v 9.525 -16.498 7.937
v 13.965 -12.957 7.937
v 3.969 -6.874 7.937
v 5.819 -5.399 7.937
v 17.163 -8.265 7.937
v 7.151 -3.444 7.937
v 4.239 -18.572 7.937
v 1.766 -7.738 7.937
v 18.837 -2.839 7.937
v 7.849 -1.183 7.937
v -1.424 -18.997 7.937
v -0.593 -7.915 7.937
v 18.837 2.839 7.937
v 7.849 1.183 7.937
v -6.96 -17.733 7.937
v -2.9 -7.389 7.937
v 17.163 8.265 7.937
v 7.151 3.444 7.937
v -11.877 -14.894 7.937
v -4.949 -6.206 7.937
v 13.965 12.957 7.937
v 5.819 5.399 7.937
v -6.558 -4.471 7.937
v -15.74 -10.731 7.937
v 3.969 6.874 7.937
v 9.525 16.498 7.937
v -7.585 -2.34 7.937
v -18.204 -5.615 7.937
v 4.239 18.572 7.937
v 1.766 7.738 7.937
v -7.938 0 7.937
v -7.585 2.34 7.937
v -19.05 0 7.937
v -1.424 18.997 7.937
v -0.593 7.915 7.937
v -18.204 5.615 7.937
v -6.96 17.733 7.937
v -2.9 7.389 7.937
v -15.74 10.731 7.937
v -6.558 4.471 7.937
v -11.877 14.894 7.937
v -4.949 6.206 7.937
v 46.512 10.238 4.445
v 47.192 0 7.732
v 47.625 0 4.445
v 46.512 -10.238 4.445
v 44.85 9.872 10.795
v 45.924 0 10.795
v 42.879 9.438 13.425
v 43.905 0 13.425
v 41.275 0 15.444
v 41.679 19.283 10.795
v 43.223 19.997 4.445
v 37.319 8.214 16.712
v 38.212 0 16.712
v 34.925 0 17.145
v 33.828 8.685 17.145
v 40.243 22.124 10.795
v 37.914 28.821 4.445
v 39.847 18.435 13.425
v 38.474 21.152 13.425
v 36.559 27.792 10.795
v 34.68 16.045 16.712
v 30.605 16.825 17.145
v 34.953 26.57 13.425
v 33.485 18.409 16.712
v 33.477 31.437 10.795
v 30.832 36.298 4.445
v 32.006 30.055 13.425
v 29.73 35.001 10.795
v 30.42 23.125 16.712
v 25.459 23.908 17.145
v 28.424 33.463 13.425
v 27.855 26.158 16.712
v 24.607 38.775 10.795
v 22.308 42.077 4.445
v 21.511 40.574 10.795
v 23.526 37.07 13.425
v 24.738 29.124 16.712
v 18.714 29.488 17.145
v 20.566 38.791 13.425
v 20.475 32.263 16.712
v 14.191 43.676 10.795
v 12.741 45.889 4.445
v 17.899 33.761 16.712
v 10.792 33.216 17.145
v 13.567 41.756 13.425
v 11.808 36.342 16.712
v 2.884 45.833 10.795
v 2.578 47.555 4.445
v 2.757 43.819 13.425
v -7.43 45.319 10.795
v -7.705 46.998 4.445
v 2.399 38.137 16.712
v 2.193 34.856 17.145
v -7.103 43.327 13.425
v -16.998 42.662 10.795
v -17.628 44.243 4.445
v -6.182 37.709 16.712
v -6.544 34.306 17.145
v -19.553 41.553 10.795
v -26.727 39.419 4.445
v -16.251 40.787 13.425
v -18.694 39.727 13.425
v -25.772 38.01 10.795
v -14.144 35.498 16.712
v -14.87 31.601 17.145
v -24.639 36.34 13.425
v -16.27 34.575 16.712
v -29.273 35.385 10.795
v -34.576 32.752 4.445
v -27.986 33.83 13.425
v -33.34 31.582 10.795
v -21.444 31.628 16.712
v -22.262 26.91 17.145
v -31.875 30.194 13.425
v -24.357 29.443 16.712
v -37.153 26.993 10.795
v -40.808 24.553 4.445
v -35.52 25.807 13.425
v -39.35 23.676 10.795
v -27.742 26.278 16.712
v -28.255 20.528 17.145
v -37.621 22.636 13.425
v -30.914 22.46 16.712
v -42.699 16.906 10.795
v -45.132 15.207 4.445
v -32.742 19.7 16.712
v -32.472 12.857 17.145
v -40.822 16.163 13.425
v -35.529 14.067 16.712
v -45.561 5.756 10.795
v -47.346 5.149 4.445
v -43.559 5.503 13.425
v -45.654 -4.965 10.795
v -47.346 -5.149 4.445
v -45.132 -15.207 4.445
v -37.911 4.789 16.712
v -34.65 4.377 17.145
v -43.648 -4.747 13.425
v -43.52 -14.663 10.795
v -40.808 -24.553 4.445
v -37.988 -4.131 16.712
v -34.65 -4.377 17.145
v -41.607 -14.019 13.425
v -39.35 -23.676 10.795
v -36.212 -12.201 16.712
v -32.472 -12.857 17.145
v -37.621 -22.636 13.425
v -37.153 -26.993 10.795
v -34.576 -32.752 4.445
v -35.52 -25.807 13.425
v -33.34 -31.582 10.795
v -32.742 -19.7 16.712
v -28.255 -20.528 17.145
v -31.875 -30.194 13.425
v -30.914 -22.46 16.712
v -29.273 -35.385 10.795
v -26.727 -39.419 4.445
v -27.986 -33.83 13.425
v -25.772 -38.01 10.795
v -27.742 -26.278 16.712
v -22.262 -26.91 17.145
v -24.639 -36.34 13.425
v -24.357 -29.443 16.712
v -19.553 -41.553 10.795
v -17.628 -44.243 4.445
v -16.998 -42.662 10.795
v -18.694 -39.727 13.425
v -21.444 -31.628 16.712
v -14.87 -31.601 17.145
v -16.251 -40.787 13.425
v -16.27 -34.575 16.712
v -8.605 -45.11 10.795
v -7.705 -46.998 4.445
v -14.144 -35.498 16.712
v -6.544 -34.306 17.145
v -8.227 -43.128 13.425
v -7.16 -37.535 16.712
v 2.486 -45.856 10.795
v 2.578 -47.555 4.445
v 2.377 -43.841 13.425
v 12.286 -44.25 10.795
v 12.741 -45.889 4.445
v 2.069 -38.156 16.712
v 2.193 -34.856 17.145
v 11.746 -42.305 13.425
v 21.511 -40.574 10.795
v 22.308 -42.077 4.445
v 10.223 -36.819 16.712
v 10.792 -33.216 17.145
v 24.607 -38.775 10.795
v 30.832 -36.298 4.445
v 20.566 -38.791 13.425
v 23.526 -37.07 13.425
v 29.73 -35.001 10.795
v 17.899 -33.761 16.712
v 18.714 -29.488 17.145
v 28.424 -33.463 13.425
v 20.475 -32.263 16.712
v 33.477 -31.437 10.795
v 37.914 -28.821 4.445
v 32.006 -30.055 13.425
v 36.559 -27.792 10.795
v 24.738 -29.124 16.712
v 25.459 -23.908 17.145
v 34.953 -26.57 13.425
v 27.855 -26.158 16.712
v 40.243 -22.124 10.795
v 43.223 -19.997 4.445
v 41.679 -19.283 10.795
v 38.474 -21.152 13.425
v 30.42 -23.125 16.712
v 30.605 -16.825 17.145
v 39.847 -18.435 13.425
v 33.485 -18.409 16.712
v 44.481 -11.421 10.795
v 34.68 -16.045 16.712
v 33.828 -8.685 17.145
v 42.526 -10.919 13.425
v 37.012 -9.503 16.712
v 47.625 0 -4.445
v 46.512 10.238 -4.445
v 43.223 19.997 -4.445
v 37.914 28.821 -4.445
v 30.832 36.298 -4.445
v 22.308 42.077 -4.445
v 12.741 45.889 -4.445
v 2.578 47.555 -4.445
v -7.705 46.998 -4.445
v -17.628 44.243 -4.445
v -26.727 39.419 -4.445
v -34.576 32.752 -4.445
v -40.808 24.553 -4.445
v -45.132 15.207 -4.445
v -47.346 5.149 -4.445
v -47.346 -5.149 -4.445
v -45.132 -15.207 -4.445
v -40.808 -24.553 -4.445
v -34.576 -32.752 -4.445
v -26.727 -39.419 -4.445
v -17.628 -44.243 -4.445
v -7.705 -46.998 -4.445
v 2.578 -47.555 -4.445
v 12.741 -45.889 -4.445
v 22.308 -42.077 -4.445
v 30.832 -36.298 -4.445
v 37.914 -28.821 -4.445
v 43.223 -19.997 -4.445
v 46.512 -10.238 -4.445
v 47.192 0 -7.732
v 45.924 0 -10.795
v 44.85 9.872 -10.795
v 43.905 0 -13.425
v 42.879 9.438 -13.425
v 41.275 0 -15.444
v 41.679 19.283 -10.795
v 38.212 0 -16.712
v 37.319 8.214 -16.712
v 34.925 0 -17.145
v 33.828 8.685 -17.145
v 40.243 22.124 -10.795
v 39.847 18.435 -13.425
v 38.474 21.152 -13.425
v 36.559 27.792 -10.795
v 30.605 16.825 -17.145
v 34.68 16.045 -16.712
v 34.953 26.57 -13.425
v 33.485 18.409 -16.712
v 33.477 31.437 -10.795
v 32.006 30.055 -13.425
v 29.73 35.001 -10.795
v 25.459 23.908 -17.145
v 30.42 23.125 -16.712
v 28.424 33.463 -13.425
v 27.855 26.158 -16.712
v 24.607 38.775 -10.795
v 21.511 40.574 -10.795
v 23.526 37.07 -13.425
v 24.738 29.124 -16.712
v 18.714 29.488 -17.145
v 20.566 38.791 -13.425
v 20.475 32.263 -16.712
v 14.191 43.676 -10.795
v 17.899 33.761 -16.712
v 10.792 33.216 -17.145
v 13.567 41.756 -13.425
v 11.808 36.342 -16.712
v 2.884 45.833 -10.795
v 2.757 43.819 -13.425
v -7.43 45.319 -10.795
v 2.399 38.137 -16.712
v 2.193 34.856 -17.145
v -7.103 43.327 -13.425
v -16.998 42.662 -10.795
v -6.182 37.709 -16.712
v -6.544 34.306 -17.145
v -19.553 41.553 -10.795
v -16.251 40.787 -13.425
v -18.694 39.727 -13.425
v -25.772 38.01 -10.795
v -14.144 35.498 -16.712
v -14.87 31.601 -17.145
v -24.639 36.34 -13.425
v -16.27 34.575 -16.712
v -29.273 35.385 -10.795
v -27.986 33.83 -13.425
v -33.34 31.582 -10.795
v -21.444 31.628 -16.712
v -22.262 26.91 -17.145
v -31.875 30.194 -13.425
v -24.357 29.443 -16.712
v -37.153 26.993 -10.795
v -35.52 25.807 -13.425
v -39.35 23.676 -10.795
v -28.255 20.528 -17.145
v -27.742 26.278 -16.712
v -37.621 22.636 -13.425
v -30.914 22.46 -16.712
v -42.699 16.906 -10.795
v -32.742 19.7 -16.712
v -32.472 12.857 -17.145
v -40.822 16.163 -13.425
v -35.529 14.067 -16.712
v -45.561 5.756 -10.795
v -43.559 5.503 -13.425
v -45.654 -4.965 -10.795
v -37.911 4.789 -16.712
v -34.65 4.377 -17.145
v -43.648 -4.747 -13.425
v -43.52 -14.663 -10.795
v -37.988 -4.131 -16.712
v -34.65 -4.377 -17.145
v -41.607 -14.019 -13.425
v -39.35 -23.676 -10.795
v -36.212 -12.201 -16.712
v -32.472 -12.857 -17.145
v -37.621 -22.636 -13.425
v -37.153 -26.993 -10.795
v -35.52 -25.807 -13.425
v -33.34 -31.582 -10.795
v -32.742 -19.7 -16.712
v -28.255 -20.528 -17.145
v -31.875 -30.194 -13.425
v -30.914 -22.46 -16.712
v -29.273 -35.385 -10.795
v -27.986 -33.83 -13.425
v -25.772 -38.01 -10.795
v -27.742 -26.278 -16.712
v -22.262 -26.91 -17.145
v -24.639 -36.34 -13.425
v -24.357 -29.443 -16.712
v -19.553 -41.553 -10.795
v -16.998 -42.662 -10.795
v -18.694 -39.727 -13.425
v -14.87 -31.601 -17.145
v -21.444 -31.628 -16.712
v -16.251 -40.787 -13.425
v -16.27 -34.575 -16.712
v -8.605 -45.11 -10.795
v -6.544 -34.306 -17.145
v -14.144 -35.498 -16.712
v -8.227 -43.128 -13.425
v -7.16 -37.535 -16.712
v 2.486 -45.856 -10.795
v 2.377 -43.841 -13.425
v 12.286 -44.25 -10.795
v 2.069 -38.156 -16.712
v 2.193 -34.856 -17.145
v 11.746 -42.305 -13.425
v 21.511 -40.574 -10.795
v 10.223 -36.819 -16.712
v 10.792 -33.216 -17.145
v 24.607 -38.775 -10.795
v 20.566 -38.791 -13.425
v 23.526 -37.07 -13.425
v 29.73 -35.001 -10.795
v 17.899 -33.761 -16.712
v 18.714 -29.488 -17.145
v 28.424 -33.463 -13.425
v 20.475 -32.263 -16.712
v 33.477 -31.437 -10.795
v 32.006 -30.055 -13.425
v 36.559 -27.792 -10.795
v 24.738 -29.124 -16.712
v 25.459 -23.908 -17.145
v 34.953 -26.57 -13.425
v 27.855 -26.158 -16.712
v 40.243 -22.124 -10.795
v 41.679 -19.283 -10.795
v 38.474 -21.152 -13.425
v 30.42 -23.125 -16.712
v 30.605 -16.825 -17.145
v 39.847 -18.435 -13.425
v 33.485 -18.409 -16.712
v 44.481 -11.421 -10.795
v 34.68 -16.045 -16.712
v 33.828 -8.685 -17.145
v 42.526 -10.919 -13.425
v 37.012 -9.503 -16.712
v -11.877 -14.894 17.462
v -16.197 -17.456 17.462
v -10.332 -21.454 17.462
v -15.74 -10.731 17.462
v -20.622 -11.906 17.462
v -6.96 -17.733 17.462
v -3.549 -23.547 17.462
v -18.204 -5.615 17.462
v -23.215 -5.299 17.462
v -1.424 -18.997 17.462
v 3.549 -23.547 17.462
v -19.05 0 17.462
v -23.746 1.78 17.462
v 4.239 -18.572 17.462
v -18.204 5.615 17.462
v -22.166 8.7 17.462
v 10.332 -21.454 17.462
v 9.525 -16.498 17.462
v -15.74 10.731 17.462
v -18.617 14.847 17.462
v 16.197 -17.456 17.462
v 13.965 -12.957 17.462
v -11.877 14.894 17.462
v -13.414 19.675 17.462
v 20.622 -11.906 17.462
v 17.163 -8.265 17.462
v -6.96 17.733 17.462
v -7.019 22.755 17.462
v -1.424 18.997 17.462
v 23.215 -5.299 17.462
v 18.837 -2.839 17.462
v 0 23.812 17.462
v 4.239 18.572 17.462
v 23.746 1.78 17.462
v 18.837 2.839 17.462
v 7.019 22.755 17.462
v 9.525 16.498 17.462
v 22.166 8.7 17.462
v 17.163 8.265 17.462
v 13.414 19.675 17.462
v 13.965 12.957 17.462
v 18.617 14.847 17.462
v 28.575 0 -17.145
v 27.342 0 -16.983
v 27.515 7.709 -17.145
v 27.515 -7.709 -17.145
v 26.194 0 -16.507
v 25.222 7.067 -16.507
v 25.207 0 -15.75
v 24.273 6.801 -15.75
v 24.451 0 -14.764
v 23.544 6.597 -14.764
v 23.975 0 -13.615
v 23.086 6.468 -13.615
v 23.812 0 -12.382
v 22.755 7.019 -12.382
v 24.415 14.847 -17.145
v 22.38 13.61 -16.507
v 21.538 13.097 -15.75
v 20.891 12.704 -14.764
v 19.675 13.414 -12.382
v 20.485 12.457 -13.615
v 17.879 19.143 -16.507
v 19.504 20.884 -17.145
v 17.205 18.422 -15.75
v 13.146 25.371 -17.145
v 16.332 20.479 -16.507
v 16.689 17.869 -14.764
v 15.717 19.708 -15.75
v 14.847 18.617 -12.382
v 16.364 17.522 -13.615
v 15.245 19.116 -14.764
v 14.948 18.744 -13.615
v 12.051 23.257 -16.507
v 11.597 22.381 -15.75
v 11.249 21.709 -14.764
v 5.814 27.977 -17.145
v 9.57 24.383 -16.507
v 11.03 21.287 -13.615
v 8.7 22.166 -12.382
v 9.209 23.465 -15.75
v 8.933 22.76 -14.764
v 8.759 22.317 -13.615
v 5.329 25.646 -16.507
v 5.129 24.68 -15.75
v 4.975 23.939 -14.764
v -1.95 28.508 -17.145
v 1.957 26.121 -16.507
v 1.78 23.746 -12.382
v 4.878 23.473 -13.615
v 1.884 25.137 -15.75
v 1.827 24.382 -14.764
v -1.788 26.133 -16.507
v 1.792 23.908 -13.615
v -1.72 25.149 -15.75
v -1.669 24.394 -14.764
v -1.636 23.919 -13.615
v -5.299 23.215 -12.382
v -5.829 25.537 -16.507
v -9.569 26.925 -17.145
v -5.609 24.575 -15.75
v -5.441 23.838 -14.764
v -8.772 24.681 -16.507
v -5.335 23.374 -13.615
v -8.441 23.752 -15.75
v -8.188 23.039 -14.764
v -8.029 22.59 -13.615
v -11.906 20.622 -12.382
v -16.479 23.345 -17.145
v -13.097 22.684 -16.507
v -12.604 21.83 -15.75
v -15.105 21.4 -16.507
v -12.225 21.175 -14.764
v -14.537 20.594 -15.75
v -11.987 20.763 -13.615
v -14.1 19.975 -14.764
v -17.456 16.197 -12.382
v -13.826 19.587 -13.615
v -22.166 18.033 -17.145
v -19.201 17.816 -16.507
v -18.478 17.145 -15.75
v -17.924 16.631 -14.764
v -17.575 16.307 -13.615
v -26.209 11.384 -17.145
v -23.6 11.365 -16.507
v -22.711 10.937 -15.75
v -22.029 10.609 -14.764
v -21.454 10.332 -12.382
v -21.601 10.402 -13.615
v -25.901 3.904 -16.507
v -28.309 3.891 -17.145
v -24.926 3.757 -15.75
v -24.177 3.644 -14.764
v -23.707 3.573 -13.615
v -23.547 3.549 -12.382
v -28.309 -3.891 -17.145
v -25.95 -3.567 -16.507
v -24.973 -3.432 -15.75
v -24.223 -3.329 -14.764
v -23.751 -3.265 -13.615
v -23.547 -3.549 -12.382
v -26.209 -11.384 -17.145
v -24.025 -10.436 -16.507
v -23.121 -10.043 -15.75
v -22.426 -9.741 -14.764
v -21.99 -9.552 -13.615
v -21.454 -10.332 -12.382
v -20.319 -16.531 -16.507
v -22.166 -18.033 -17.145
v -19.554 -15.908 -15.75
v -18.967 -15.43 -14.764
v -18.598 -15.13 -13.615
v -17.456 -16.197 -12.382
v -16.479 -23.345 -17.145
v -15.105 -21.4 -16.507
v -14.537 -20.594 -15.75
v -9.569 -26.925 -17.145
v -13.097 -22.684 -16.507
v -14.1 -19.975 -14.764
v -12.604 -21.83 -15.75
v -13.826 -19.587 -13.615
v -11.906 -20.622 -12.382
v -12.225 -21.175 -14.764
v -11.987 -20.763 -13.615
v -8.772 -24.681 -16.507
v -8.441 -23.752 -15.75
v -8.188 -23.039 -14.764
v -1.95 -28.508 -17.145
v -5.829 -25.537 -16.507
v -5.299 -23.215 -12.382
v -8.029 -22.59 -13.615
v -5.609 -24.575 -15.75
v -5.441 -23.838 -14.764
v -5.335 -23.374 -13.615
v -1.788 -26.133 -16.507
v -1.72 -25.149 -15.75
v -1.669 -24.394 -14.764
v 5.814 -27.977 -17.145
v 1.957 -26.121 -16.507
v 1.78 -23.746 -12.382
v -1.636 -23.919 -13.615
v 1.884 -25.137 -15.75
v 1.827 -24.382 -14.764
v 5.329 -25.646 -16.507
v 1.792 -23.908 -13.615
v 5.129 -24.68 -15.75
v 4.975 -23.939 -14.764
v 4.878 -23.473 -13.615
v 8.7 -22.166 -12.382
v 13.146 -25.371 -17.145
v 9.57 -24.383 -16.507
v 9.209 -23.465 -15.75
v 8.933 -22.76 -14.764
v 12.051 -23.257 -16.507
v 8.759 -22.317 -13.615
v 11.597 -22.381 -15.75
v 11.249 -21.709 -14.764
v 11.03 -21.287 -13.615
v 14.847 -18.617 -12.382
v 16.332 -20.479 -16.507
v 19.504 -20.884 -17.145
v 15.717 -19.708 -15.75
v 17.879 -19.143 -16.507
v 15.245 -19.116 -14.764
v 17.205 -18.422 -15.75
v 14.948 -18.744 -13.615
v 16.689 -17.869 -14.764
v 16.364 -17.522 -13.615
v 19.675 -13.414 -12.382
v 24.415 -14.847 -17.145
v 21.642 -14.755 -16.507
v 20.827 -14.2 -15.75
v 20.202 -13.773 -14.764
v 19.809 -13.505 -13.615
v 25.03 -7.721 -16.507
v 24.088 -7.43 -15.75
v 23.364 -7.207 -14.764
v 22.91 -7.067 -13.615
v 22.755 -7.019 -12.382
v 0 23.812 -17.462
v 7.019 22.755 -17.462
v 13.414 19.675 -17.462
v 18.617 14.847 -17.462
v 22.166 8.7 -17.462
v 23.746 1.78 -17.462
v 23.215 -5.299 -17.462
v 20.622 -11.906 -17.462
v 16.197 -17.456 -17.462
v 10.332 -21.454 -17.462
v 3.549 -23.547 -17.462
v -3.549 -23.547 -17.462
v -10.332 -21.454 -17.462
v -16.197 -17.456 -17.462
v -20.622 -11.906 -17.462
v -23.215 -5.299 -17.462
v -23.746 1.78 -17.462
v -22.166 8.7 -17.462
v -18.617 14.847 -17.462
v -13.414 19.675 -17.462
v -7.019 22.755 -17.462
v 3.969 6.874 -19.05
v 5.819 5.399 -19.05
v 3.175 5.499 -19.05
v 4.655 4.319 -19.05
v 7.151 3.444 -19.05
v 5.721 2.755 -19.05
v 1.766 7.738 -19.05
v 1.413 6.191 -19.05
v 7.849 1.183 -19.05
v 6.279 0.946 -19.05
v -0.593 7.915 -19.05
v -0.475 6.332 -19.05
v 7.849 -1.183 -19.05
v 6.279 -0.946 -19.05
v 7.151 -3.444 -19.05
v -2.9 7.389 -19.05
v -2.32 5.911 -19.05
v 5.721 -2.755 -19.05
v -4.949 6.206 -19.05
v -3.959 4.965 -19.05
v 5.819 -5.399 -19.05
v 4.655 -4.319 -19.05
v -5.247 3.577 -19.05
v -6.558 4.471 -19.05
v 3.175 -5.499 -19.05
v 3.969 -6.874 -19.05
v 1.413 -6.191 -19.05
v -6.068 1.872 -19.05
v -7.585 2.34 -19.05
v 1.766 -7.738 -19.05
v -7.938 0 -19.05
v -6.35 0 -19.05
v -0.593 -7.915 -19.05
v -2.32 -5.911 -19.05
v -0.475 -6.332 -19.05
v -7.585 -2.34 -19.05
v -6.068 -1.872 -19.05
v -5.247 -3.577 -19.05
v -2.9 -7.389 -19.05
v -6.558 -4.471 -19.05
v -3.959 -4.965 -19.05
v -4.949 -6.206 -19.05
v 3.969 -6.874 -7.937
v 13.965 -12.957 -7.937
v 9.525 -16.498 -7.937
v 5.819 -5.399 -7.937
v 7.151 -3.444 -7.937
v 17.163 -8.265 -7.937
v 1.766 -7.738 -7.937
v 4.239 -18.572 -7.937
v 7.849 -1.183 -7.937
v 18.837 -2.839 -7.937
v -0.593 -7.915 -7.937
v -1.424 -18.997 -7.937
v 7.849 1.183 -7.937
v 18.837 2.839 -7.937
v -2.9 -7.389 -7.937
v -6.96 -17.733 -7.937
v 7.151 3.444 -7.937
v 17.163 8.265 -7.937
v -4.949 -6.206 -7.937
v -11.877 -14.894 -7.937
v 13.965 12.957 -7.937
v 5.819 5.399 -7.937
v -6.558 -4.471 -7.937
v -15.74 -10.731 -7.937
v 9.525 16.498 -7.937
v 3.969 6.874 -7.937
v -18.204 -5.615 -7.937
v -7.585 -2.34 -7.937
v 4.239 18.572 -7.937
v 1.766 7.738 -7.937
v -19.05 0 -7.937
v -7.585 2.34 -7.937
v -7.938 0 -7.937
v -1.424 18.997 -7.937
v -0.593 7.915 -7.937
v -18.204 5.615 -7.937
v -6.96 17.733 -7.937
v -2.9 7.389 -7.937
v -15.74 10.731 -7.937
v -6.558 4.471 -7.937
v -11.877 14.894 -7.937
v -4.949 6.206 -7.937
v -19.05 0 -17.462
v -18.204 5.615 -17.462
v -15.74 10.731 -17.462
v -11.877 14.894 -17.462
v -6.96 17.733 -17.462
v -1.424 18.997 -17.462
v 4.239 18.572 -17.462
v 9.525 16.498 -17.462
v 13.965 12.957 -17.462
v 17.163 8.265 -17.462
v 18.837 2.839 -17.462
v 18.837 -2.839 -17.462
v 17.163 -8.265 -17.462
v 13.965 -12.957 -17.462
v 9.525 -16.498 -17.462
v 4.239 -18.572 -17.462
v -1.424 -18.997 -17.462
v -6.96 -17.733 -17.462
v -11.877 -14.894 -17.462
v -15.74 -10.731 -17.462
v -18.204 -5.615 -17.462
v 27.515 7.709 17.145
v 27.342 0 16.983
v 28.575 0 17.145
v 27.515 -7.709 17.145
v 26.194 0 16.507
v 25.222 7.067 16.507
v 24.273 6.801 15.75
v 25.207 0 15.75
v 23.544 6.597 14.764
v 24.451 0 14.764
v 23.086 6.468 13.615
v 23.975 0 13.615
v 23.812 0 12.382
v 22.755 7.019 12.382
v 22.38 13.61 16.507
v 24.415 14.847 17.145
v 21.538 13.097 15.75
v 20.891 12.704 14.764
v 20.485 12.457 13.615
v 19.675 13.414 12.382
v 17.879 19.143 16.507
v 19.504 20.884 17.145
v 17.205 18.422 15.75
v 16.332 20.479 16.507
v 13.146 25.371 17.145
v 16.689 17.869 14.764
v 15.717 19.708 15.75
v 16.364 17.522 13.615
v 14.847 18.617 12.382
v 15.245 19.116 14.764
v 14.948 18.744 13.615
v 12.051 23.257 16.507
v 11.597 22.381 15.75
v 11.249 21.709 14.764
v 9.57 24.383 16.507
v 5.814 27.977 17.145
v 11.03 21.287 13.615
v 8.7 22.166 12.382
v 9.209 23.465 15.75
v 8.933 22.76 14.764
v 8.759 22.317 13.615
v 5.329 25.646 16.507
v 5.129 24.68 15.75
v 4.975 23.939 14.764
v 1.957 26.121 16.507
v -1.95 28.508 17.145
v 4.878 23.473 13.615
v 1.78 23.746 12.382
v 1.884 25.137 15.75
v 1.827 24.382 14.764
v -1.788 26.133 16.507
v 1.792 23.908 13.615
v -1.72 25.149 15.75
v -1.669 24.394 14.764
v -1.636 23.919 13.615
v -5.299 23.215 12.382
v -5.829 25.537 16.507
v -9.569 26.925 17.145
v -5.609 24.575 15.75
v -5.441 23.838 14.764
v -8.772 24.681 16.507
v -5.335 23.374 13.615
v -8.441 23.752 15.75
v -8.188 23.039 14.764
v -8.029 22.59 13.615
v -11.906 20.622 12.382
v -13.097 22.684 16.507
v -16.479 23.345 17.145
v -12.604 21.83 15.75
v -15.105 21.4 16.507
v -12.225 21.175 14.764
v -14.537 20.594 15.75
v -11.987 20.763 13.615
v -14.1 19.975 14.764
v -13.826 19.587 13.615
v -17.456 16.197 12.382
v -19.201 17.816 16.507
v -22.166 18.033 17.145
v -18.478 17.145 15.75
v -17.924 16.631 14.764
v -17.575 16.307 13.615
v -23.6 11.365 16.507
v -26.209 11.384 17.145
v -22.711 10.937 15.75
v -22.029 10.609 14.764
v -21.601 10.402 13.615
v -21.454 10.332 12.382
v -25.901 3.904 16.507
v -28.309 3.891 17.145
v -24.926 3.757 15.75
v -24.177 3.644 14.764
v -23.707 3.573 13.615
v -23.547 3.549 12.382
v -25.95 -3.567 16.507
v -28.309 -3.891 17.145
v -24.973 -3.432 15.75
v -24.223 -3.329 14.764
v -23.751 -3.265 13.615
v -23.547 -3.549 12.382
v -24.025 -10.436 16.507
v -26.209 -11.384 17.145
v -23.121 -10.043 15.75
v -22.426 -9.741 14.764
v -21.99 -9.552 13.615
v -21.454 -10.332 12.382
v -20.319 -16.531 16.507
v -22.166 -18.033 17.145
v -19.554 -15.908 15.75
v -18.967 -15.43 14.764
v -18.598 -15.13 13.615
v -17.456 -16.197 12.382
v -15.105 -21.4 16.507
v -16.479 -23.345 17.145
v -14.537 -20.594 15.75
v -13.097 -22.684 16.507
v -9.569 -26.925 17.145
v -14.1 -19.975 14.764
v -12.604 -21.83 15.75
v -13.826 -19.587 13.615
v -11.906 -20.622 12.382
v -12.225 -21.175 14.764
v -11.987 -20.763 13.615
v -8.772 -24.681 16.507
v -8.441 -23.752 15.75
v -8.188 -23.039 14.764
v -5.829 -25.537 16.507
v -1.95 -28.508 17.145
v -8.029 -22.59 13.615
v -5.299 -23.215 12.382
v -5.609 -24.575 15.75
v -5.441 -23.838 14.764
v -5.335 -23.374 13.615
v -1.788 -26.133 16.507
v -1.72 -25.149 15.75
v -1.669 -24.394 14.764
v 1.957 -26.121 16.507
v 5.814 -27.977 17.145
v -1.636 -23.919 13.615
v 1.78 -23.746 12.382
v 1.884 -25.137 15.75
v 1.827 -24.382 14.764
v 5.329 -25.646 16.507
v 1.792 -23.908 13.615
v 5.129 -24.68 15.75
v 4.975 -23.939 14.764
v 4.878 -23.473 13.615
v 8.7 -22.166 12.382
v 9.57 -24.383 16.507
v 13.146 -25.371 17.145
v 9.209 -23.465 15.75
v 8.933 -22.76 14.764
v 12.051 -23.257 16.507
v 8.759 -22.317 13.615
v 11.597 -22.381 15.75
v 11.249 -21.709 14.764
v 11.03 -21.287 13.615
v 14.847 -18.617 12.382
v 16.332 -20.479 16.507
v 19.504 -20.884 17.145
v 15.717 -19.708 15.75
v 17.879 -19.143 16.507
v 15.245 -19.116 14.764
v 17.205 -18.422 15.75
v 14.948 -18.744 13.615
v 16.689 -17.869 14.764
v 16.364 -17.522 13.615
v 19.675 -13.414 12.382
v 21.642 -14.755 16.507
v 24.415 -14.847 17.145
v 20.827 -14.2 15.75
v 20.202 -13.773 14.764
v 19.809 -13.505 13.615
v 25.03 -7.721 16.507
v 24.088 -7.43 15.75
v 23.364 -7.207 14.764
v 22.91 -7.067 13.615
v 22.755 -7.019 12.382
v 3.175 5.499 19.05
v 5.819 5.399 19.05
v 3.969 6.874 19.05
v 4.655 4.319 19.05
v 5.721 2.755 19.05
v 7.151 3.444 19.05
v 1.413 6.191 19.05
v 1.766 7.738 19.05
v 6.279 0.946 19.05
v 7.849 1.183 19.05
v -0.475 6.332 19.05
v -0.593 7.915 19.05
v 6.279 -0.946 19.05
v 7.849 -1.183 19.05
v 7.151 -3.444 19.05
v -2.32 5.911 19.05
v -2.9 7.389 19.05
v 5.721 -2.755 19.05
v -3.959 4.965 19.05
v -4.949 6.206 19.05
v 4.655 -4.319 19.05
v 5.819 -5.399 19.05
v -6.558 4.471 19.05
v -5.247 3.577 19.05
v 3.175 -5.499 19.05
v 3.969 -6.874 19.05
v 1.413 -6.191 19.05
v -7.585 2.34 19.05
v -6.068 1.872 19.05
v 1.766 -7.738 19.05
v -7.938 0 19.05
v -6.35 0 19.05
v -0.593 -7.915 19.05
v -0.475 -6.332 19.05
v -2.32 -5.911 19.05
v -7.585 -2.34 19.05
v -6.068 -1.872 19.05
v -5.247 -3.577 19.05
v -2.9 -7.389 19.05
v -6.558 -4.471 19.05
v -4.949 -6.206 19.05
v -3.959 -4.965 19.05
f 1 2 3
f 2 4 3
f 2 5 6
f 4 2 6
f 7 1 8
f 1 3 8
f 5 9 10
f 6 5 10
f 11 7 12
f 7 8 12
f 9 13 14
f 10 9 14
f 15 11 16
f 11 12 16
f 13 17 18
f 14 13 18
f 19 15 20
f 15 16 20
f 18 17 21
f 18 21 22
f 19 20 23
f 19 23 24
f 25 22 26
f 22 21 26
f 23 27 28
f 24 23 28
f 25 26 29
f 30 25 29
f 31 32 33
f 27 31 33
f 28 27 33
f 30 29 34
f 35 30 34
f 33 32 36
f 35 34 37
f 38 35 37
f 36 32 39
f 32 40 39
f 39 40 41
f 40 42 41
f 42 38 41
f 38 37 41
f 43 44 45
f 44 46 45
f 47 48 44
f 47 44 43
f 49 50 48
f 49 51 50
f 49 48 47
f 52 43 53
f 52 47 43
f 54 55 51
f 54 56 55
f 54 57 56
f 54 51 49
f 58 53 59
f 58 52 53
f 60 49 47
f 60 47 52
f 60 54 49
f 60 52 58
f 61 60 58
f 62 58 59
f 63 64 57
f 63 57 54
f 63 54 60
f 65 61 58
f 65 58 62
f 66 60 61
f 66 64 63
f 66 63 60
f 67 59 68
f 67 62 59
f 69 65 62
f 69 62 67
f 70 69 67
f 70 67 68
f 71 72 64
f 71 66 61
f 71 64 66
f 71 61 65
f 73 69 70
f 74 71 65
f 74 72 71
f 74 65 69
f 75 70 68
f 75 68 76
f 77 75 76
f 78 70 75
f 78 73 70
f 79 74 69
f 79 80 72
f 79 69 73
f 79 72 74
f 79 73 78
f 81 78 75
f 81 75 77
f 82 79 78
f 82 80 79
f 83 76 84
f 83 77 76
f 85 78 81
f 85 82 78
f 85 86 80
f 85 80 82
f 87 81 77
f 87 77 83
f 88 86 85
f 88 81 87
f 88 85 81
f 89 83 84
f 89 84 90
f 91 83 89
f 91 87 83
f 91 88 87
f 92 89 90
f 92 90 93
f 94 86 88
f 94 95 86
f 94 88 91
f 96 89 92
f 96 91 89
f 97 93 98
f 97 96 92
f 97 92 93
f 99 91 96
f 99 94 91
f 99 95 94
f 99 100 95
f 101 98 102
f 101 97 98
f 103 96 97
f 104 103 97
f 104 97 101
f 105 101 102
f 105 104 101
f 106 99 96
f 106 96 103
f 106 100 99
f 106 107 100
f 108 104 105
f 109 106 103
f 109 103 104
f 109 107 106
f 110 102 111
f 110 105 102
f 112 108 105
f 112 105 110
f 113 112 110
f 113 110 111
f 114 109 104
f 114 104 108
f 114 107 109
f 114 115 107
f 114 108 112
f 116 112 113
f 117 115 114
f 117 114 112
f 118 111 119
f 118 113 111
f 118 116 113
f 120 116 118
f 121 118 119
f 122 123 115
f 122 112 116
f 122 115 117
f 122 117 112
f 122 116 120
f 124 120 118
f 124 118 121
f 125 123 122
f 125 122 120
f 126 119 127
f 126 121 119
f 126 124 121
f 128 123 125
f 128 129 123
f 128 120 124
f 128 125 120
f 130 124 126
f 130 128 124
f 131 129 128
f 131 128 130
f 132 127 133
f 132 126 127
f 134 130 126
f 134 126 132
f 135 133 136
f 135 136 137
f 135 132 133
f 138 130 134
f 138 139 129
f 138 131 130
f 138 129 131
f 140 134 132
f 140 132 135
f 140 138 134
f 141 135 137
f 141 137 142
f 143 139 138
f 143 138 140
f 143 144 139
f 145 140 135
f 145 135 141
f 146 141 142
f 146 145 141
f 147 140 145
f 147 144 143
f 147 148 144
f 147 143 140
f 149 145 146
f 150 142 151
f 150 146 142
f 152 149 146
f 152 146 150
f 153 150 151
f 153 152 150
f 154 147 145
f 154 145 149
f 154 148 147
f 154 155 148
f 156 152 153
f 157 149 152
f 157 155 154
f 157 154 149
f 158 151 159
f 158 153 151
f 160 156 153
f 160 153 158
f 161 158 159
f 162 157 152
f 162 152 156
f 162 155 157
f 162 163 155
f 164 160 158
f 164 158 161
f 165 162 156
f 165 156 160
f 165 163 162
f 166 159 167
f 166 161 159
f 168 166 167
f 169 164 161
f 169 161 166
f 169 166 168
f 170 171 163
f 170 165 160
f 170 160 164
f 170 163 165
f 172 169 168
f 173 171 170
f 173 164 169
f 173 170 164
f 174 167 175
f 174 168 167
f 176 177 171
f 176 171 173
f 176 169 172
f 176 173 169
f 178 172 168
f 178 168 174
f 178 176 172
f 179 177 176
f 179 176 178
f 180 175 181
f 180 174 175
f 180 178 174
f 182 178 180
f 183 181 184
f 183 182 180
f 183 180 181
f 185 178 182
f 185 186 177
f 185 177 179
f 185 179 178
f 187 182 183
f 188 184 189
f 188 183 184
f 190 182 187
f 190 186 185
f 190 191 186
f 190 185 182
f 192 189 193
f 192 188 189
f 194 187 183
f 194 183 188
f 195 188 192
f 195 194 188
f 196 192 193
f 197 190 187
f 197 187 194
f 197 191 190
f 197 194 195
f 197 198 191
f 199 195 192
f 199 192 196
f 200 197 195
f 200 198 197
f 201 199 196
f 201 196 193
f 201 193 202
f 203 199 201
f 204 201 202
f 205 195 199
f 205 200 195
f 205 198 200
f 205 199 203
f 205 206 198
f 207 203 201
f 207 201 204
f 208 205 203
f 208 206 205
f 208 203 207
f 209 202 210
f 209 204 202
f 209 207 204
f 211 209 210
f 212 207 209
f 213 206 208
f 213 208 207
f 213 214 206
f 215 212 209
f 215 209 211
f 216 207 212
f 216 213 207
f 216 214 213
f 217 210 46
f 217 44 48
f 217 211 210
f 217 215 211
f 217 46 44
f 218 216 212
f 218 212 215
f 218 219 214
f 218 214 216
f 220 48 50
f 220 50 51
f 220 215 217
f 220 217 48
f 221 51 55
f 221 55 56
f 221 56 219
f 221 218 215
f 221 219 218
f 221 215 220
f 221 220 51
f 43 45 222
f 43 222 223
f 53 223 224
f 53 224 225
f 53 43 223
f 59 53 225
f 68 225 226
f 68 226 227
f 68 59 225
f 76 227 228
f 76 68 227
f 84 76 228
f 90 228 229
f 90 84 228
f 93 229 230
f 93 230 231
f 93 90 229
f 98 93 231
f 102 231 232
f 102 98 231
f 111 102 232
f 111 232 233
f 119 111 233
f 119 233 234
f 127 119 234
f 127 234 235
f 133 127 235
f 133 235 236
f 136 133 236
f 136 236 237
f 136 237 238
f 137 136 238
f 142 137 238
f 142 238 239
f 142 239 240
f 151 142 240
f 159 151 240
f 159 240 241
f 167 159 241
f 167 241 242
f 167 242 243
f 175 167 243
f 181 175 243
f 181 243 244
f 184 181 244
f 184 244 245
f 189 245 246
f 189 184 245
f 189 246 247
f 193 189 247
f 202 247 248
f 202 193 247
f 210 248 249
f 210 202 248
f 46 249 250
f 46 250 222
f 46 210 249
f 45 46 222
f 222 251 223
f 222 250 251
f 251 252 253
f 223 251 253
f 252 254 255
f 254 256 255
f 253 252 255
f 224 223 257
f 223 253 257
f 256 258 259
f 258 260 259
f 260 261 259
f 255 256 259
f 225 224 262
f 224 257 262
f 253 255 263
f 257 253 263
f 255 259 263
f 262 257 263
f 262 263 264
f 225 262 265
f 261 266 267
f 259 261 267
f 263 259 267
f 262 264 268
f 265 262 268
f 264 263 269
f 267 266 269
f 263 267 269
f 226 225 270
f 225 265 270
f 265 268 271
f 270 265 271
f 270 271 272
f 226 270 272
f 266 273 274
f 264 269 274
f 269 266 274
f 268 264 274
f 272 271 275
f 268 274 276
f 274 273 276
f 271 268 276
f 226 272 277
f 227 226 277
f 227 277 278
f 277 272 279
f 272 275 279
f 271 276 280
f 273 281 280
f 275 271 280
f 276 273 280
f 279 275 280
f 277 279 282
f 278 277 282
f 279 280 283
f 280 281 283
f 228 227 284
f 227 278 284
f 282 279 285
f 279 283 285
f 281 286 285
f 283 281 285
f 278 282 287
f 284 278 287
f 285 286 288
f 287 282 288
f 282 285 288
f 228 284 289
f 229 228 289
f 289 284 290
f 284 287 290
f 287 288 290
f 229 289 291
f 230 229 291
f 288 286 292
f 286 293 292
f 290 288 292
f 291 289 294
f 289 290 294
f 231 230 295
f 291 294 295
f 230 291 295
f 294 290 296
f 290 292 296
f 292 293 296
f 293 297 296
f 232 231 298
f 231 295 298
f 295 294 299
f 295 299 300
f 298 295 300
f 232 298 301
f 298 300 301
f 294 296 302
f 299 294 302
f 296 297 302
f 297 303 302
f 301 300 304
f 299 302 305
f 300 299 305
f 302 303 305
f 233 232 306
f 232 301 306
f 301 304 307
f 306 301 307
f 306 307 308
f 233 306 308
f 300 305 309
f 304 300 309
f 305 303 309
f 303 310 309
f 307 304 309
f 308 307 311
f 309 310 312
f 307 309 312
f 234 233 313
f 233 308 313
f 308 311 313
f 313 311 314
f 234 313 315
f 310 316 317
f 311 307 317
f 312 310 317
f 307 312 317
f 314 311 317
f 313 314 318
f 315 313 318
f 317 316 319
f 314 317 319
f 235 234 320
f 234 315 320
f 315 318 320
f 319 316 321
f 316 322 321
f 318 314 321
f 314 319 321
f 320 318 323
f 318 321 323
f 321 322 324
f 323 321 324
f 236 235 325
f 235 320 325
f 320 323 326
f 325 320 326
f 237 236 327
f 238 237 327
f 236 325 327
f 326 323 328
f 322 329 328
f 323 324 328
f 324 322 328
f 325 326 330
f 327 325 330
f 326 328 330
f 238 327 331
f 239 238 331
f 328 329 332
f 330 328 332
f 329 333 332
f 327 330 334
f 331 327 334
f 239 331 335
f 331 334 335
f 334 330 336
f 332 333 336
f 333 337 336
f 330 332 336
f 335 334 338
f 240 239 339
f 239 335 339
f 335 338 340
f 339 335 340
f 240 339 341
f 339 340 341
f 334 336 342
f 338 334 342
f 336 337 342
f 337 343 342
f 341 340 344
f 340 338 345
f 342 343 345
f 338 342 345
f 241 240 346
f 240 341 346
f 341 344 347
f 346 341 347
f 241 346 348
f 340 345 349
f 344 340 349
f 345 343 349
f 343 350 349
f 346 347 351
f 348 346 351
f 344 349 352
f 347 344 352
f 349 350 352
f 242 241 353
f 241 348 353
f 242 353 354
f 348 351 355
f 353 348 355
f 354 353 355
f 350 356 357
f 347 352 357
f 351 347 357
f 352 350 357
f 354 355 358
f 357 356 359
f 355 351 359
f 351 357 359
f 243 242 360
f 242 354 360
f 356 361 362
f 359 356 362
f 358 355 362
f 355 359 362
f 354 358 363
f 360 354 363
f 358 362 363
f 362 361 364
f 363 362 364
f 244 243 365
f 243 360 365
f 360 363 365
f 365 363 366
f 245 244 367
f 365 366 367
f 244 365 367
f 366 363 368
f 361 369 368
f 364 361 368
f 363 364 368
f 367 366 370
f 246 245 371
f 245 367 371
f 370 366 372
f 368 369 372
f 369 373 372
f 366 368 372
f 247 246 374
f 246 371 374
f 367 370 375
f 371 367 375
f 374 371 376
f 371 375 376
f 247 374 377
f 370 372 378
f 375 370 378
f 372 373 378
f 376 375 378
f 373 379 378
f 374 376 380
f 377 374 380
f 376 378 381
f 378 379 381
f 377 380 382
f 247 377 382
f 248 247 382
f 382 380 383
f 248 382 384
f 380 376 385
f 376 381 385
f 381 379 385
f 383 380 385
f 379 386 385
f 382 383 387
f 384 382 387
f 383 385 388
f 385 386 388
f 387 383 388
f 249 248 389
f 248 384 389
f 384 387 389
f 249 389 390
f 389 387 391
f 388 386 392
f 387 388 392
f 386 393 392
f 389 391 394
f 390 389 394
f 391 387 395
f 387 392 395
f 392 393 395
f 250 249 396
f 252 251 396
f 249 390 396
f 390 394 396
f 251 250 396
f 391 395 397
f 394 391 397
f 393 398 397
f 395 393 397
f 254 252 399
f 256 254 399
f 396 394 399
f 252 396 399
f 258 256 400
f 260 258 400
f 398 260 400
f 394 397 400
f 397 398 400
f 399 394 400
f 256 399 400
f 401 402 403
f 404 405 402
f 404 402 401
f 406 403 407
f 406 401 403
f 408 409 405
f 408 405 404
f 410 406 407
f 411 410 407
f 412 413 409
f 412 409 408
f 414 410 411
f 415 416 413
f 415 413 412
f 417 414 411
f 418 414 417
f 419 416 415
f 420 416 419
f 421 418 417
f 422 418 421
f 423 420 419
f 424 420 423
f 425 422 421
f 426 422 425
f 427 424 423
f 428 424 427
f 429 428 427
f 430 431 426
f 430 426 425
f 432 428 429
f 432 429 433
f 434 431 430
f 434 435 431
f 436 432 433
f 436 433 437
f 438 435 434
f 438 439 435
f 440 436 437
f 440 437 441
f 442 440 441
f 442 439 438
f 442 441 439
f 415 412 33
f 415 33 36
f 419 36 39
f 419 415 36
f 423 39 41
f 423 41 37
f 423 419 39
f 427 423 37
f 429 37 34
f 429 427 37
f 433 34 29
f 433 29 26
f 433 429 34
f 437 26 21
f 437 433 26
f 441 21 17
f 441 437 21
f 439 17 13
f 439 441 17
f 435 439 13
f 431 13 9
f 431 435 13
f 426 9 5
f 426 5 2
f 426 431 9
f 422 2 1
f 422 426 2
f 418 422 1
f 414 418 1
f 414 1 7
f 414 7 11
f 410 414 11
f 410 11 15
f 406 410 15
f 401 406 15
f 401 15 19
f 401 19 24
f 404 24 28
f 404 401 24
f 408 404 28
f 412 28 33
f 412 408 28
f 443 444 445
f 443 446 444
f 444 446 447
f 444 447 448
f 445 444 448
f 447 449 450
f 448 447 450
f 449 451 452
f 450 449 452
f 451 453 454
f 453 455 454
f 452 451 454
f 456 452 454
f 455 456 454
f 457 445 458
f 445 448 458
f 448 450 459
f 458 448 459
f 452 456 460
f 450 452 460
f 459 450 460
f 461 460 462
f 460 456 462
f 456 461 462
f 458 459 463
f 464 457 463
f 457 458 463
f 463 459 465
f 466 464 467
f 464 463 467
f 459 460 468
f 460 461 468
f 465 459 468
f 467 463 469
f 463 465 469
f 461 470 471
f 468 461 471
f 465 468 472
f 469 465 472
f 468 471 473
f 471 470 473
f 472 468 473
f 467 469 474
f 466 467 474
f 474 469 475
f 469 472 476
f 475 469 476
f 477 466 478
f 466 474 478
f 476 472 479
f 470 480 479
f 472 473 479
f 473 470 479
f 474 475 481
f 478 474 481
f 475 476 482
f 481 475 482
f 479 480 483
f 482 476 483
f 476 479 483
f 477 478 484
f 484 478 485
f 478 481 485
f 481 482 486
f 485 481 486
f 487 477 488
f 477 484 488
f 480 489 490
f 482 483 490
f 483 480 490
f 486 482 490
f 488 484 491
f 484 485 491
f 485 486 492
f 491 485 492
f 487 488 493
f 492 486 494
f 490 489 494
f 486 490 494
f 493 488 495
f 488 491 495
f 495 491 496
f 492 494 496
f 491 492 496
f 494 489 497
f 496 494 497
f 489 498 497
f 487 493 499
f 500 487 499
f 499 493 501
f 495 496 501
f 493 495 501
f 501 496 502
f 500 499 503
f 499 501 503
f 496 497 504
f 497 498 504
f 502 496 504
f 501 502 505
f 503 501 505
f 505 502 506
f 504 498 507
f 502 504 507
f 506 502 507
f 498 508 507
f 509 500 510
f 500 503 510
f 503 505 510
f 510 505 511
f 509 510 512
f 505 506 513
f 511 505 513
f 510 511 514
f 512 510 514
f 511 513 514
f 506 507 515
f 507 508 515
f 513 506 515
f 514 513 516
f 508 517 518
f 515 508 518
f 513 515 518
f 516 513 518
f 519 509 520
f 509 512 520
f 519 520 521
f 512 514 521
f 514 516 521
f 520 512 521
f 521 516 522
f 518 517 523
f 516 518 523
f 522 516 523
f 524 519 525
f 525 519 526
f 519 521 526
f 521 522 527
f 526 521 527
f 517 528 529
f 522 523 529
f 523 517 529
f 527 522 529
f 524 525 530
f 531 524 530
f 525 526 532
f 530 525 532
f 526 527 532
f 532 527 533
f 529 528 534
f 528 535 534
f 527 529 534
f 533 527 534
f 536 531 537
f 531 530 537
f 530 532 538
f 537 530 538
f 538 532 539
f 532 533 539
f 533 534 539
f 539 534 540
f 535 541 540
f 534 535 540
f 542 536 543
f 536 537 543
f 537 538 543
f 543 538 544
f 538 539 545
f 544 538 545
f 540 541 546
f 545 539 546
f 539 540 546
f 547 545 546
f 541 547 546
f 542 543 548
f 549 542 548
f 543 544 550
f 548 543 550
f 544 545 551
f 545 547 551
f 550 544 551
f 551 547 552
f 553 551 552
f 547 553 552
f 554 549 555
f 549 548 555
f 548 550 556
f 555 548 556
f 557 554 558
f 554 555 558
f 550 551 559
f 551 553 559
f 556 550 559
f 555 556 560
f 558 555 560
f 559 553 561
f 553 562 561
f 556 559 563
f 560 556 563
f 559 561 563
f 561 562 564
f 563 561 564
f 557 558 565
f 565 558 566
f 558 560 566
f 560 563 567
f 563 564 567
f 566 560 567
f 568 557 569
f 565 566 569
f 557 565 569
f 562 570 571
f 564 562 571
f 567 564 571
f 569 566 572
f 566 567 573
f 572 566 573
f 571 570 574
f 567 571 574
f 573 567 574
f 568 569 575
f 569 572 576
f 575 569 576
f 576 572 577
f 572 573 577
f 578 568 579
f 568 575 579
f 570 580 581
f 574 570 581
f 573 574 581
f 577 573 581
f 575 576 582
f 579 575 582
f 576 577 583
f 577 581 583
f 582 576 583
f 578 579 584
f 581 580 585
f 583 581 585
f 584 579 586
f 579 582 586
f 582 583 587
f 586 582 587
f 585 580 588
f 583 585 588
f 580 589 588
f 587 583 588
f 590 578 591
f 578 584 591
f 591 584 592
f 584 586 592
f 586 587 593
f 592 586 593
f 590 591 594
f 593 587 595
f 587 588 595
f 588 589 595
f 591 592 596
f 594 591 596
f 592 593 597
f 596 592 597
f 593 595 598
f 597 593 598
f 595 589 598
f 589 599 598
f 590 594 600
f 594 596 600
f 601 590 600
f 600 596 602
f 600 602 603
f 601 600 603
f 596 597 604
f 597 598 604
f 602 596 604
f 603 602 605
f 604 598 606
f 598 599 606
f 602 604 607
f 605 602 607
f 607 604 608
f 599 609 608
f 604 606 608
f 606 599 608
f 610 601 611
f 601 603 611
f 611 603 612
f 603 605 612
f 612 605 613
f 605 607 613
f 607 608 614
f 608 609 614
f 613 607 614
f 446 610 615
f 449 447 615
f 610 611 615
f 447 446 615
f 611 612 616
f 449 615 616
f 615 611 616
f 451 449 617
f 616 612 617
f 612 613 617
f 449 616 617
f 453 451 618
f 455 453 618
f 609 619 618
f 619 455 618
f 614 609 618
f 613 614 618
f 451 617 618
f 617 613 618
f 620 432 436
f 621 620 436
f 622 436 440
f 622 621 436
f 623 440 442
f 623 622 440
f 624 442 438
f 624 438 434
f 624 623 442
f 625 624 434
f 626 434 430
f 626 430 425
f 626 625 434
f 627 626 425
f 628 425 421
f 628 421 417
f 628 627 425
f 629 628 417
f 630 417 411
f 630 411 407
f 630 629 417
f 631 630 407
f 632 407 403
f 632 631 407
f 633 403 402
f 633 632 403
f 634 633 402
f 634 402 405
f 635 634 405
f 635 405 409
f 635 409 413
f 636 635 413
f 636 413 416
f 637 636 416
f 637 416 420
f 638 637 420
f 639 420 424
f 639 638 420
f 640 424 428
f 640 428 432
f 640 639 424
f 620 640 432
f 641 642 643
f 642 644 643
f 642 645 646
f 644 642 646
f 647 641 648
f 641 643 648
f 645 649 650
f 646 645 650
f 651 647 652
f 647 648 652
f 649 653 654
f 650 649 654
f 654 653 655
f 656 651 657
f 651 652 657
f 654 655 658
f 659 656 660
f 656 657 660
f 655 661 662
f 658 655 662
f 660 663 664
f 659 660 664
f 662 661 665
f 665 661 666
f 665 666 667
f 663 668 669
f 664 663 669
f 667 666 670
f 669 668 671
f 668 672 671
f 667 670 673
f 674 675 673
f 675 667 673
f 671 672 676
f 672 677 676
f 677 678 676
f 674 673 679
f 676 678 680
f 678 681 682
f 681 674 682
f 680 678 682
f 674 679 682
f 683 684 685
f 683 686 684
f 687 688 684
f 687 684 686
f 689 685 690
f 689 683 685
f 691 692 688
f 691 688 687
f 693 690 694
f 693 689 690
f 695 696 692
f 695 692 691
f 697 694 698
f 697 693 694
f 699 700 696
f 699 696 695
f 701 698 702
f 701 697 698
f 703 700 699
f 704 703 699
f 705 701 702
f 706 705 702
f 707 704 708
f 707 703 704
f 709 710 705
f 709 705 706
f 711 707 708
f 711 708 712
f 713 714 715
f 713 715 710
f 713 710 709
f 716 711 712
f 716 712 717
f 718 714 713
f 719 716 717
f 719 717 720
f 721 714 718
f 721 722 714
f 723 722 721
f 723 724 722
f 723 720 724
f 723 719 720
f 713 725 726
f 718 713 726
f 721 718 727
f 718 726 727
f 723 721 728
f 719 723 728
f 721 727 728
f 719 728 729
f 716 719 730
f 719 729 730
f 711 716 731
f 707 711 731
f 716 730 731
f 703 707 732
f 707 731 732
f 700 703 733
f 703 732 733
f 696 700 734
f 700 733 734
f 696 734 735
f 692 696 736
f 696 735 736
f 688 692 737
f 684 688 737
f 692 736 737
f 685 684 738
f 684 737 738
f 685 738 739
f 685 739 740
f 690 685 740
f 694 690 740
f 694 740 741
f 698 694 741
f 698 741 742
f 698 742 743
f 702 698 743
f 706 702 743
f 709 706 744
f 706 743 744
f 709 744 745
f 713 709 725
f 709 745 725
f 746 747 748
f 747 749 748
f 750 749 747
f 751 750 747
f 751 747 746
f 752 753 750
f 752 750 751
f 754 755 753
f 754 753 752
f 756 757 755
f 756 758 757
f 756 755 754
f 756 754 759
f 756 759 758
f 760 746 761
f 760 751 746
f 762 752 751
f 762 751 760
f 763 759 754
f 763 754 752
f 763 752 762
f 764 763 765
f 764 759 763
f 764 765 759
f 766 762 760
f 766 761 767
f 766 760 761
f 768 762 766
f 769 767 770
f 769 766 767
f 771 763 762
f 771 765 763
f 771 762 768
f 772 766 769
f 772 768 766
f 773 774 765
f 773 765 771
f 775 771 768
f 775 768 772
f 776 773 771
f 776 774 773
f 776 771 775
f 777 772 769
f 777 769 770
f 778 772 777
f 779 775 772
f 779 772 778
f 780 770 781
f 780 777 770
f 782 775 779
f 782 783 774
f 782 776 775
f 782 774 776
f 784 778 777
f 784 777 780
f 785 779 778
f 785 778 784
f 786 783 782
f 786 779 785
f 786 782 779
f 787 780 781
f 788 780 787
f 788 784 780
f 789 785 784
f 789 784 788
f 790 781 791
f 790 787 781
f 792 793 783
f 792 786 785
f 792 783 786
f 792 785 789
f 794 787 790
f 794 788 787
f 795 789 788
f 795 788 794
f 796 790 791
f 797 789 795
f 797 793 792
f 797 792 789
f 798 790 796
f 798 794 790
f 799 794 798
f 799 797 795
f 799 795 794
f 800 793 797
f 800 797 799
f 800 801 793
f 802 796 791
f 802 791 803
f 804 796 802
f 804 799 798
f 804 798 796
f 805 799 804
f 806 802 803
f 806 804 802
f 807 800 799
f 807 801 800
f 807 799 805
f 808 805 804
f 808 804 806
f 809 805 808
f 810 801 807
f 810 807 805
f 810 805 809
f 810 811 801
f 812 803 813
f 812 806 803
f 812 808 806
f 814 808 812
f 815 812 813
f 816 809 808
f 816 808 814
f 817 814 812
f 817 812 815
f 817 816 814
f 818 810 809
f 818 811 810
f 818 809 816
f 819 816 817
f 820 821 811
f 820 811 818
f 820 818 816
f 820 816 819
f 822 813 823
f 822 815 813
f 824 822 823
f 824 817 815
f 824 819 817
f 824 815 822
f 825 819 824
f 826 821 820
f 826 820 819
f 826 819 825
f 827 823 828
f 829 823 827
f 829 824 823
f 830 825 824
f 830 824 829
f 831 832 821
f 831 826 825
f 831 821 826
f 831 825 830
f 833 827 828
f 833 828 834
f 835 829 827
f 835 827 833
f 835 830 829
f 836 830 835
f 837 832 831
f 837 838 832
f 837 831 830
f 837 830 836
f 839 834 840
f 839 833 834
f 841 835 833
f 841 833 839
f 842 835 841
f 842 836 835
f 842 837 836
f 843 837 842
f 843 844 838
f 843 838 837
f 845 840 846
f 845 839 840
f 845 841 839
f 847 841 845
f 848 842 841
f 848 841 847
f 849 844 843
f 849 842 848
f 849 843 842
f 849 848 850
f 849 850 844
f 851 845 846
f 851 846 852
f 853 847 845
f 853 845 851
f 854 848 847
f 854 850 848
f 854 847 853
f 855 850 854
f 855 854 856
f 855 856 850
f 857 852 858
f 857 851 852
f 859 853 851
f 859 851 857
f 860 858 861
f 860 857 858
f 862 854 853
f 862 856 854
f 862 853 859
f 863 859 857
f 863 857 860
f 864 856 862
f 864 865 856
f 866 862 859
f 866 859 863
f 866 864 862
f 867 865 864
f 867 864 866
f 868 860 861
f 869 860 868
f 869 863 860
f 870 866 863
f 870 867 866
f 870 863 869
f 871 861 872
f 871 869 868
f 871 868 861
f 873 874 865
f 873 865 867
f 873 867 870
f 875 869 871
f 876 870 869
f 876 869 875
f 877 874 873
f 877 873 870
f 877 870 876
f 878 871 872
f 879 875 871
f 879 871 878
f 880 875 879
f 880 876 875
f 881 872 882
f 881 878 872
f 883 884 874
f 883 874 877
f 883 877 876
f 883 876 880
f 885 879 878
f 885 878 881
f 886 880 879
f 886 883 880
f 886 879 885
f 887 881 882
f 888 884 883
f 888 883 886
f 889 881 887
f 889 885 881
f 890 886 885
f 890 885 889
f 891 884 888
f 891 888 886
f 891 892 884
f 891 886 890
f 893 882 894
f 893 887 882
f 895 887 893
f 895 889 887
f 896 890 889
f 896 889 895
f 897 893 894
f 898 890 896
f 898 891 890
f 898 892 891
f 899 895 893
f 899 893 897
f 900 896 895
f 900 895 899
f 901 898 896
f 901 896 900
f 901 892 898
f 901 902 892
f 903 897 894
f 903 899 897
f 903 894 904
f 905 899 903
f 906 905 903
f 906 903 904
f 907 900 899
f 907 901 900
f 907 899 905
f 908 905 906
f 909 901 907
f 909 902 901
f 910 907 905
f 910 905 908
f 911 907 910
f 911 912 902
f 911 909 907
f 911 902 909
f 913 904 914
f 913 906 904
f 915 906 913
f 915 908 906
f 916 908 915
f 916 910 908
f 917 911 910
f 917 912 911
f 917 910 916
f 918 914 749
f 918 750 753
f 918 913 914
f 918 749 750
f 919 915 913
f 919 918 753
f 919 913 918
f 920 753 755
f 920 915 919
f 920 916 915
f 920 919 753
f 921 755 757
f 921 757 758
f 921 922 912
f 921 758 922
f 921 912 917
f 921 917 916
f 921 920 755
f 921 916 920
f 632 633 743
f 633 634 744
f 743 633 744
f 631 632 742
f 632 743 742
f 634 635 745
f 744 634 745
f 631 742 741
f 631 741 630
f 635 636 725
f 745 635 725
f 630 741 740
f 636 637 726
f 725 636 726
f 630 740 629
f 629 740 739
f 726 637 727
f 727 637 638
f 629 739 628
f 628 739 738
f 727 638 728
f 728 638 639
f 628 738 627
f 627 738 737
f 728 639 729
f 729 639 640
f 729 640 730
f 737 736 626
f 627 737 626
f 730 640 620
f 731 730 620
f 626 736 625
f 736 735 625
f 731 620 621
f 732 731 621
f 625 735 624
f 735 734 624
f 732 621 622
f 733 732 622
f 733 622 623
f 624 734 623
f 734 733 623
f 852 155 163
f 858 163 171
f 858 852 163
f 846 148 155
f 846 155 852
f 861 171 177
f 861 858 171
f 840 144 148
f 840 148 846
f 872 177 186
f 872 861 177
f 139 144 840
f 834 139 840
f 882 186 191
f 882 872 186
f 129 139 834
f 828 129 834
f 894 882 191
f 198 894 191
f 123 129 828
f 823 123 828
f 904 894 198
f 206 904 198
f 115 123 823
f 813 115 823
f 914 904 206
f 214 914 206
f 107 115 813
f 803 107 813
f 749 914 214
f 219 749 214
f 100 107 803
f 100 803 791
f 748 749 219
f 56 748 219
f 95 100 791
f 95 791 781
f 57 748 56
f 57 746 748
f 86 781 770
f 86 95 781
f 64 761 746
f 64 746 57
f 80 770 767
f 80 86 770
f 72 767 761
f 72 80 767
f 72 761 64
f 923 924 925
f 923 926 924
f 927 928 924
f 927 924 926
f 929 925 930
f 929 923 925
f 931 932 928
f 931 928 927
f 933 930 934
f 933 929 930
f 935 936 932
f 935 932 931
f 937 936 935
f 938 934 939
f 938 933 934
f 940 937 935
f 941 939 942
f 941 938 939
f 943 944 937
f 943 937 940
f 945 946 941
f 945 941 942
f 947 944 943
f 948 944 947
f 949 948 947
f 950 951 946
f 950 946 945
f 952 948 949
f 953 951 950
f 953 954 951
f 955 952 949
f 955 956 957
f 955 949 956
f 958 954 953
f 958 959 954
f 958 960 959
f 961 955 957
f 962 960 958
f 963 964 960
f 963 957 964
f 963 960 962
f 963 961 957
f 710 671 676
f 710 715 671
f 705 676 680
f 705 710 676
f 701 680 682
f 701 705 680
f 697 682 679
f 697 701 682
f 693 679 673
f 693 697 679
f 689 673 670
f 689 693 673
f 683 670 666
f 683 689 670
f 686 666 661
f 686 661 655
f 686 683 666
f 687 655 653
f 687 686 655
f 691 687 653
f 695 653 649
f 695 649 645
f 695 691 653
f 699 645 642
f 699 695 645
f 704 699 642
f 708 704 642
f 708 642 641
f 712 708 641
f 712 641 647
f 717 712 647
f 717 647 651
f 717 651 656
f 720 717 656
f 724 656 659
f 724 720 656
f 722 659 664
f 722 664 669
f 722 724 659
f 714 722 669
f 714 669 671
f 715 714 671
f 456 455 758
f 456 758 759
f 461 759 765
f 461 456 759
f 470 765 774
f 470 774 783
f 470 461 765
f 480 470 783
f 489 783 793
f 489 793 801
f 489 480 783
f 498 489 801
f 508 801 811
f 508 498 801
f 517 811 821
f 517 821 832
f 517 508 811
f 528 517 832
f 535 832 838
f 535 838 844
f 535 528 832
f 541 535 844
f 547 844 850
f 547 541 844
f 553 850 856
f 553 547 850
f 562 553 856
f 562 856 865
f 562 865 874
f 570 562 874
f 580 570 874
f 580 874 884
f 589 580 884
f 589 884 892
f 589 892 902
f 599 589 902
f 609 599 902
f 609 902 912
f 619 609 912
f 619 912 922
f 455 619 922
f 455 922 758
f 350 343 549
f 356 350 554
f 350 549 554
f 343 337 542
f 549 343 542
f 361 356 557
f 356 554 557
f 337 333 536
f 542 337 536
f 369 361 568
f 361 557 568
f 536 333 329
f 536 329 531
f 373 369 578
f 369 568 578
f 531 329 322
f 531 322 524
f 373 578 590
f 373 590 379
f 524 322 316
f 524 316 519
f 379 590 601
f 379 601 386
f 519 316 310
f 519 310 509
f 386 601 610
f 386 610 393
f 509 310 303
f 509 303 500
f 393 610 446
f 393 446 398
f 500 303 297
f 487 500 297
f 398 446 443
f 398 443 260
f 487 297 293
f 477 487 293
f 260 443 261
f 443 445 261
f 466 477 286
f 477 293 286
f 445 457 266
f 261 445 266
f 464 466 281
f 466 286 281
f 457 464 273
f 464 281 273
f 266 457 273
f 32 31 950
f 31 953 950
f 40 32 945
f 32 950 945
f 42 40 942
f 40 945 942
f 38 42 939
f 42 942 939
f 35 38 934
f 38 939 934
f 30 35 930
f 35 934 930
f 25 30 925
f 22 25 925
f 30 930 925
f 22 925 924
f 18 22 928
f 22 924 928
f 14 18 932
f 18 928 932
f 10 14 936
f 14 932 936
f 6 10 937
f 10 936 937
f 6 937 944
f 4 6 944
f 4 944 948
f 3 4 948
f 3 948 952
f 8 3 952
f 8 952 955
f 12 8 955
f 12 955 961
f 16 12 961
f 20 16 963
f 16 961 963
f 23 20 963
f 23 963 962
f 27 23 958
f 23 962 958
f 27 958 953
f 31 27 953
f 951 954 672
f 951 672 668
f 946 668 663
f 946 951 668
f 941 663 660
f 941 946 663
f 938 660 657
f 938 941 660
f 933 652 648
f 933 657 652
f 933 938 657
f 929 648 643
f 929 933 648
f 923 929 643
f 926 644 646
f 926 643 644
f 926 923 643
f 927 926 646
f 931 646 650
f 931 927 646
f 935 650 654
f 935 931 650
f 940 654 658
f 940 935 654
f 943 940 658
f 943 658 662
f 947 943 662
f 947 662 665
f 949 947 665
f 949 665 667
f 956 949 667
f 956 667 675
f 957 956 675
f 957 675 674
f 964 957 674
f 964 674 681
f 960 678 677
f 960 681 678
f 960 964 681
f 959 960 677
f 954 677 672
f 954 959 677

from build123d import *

# Parameters (mm, degrees)
SKETCH1_R               = 47.625
SKETCH1_R_2             = 23.8125
BOSS_EXTRUDE1_DEPTH     = 17.145
FILLET1_R               = 12.7
FILLET2_R               = 4.7625
SKETCH2_R               = 25.4
BOSS_EXTRUDE2_DEPTH     = 17.4625
SKETCH3_W               = 34.925
SKETCH3_H               = 1.5875
SKETCH4_R               = 19.05
SKETCH4_R_2             = 7.9375
CUT_EXTRUDE1_DEPTH      = 9.525
SKETCH5_R               = 7.9375
BOSS_EXTRUDE3_DEPTH     = 19.05
CUT_EXTRUDE2_DEPTH      = 77.612296113
CUT_EXTRUDE2_DEPTH_BACK = 77.612296113
SKETCH6_R               = 6.35


with BuildPart() as part:
    # Sketch1 → Boss-Extrude1 (new, symmetric)
    with BuildSketch(Plane.XY):
        Circle(SKETCH1_R)
        Circle(SKETCH1_R_2, mode=Mode.SUBTRACT)
    extrude(amount=BOSS_EXTRUDE1_DEPTH, both=True)

    # Fillet1
    fillet1_edges = [part.edges().sort_by_distance(p)[0] for p in [
        (-47.625, 0, -17.145),
        (-47.625, 0, 17.145),
    ]]
    fillet(fillet1_edges, radius=FILLET1_R)

    # Fillet2
    fillet2_edges = [part.edges().sort_by_distance(p)[0] for p in [
        (-23.8125, 0, -17.145),
        (-23.8125, 0, 17.145),
    ]]
    fillet(fillet2_edges, radius=FILLET2_R)


with BuildPart() as body_2:
    # Sketch2 → Boss-Extrude2 (new, symmetric)
    with BuildSketch(Plane.XY):
        Circle(SKETCH2_R)
    extrude(amount=BOSS_EXTRUDE2_DEPTH, both=True)

    # Sketch3 → Cut-Revolve1 (revolve, cut)
    with BuildSketch(Plane(origin=(0, 0, 0), x_dir=(0, 0, -1), z_dir=(1, 0, 0))):
        with Locations((0, 24.60625)):
            Rectangle(SKETCH3_W, SKETCH3_H)
    revolve(axis=Axis((0, 0, 0), (0, 0, -1)), mode=Mode.SUBTRACT)

    # Sketch4 → Cut-Extrude1 (cut)
    with BuildSketch(Plane(origin=(0, 0, -17.4625), x_dir=(-1, 0, 0), z_dir=(0, 0, -1))):
        Circle(SKETCH4_R)
        Circle(SKETCH4_R_2, mode=Mode.SUBTRACT)
    cut_extrude1 = extrude(amount=-CUT_EXTRUDE1_DEPTH, mode=Mode.SUBTRACT)

    # Mirror1: Cut-Extrude1 across plane
    add(cut_extrude1.mirror(Plane.XY), mode=Mode.SUBTRACT)

    # Sketch5 → Boss-Extrude3 (add, symmetric)
    with BuildSketch(Plane.XY):
        with Locations(Location((0, 0, 0), (0, 0, 180))):
            Circle(SKETCH5_R)
    extrude(amount=BOSS_EXTRUDE3_DEPTH, both=True)

    # Sketch6 → Cut-Extrude2 (cut, two sides: drawn at the far end of the back side and taken through both)
    with BuildSketch(Plane(origin=(0, 0, -17.4625), x_dir=(-1, 0, 0), z_dir=(0, 0, -1)).offset(-CUT_EXTRUDE2_DEPTH_BACK)):
        Circle(SKETCH6_R)
    extrude(amount=CUT_EXTRUDE2_DEPTH + CUT_EXTRUDE2_DEPTH_BACK, mode=Mode.SUBTRACT)


solid = Compound([part.part, body_2.part])
